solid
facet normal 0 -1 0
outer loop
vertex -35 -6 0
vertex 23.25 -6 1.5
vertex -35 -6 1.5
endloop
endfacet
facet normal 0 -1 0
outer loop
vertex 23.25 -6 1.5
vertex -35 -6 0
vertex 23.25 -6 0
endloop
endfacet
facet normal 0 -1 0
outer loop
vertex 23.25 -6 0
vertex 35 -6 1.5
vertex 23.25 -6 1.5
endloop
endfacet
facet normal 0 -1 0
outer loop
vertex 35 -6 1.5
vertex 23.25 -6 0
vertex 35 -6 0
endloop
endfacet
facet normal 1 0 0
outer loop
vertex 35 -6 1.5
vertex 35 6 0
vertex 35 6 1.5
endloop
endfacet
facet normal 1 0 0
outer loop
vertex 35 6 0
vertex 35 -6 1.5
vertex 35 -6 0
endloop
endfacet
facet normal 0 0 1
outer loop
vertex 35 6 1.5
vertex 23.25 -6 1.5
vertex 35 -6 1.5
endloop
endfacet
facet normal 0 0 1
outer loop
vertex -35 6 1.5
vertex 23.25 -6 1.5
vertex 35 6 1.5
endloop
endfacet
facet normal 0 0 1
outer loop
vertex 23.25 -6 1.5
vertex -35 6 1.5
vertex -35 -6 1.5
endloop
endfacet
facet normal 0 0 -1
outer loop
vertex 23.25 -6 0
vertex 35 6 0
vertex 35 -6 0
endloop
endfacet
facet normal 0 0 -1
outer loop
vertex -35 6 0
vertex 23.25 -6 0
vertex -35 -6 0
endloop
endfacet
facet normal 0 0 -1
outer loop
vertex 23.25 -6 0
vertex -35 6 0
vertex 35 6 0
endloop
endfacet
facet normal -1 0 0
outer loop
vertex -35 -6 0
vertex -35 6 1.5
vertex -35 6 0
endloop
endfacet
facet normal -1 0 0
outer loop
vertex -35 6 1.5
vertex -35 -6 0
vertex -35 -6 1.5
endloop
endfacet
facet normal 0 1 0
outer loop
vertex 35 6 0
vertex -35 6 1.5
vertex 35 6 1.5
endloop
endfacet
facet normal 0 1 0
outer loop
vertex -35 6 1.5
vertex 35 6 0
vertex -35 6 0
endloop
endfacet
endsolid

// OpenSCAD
// 10-well comb for casting agarose gels, printed lying flat
// Units: mm

$fn = 64;

// --- Plate / spine ---
plate_len   = 70;   // spine length (X)
plate_wid   = 12;   // spine width (Y)
plate_thk   = 1.5;  // plate thickness (Z)

// --- Teeth ---
tooth_count = 10;   // number of wells
tooth_w     = 5.0;  // tooth width (X)
tooth_l     = 12;   // tooth length (Y)
tooth_pitch = 1.5;  // centre-to-centre spacing (X)

// --- Cutting overlap ---
eps = 0.5;          // extension past cut faces

// --- Derived ---
row_len   = (tooth_count - 1) * tooth_pitch + tooth_w;  // row of teeth (X)
overhang  = plate_len / 2 - row_len / 2;                // centre offset (X)

difference() {
    // Base plate
    translate([-plate_len / 2, -plate_wid / 2, 0])
        cube([plate_len, plate_wid, plate_thk]);

    // Teeth, hanging in -Y, centred on spine
    for (i = [0 : tooth_count - 1]) {
        translate([overhang + i * tooth_pitch - tooth_w / 2,
                   -plate_wid / 2 - tooth_l,
                   0])
            cube([tooth_w, tooth_l, plate_thk + eps]);
    }
}
